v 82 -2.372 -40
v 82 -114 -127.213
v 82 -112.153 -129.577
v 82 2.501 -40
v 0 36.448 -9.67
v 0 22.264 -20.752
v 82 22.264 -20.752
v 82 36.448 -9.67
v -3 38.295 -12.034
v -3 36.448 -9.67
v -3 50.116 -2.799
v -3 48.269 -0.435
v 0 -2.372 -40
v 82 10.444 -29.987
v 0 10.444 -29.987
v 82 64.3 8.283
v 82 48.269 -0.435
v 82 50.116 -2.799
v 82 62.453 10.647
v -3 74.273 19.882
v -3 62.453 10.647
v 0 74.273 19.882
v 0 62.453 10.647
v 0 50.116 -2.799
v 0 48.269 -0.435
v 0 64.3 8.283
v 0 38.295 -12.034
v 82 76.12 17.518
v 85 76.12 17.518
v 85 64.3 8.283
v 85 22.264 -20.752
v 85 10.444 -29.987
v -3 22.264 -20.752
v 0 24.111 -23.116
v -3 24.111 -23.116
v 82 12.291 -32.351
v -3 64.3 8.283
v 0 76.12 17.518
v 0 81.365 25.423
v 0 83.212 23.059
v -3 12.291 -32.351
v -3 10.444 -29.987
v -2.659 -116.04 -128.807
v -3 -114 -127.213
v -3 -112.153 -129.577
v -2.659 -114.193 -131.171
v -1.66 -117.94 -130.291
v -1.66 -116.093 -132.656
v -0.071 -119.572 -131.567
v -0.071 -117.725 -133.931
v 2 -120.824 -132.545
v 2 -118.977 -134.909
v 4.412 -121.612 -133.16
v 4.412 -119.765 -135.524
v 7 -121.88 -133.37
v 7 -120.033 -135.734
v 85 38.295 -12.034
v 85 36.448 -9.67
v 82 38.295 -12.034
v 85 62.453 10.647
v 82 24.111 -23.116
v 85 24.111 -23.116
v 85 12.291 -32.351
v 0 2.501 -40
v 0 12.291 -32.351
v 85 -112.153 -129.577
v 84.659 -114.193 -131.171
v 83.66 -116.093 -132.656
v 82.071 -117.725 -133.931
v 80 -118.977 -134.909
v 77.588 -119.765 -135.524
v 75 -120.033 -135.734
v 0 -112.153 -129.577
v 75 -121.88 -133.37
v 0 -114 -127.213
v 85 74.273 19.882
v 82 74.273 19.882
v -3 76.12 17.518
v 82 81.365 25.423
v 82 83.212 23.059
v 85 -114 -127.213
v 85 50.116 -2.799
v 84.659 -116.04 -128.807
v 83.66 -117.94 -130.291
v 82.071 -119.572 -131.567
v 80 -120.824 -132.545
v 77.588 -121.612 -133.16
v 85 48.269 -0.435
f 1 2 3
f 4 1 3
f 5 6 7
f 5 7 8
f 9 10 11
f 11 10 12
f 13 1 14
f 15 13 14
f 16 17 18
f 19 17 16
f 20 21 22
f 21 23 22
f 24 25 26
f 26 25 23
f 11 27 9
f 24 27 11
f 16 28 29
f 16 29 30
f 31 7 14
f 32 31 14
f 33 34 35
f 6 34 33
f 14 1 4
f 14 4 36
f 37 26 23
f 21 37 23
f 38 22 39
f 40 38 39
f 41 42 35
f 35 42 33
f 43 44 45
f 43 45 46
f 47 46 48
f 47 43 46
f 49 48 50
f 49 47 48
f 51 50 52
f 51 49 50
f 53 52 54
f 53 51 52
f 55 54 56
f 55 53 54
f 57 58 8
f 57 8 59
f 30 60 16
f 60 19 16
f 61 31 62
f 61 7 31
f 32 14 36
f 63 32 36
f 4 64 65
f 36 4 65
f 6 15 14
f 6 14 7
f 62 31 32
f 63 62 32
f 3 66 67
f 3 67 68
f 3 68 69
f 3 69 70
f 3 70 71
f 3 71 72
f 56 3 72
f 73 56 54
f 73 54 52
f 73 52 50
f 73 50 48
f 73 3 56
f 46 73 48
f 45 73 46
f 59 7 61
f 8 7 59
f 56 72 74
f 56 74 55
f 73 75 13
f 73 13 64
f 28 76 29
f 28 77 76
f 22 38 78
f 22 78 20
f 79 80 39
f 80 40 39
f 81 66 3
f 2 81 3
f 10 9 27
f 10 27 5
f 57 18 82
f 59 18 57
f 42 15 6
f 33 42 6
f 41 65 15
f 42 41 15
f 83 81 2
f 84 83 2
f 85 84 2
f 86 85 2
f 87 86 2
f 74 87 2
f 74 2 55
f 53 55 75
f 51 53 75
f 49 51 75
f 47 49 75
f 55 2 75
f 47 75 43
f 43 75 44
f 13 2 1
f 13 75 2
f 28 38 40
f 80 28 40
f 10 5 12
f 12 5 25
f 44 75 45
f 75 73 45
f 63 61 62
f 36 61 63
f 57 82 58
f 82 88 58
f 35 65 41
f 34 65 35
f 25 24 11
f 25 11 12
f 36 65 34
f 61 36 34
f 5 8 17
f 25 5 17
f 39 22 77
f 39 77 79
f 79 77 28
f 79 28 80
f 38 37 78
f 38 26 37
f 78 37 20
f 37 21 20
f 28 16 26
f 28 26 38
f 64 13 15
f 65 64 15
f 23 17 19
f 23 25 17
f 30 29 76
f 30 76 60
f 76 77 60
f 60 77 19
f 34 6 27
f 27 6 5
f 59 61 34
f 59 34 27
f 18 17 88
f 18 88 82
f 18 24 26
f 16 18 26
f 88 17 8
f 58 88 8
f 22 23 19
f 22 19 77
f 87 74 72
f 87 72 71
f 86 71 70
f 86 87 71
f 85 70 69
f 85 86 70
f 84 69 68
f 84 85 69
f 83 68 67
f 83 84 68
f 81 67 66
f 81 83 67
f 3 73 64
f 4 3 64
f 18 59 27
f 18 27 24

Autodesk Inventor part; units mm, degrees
ref_plane "YZ Plane" through (0, 0, 0) normal (1, 0, 0) x (0, 1, 0)
ref_plane "XZ Plane" through (0, 0, 0) normal (0, 1, 0) x (-1, 0, 0)
sketch "Sketch2" plane through (0, 0, 0) normal (1, 0, 0) x (0, 1, 0)
  line L0 (-114, -127.2132) -> (-112.153, -129.5772)
  line L1 (-112.153, -129.5772) -> (84, 23.6743)
  line L2 (-114, -127.2132) -> (-114, -57.4172)
  line L3 (-114, -57.4172) -> (-84, -33.9786)
  circle A0 centre (0, 5) radius 17.5
  circle A1 centre (0, 5) radius 31
  line L4 (-114, -127.2132) -> (84, 27.4814)
  line L5 (84, -40) -> (84, 40)
  line L6 (-84, -40) -> (84, -40)
  line L7 (76.1199, 17.5177) -> (74.2729, 19.8817)
  line L8 (64.2997, 8.2828) -> (62.4527, 10.6468)
  line L9 (-84, 40) -> (-84, -40)
  line L10 (84, 40) -> (-84, 40)
  line L11 (38.2954, -12.034) -> (36.4484, -9.67)
  line L12 (50.1155, -2.7991) -> (48.2686, -0.4351)
  line L13 (12.291, -32.3509) -> (10.444, -29.9868)
  line L14 (24.1112, -23.116) -> (22.2642, -20.7519)
  line L15 (83.212, 23.0587) -> (81.365, 25.4227)
  point P0 (0, 0)
  dimension "d49" = 3
  dimension "d37" = 62
  dimension "d38" = 35
  dimension "d39" = 142
  dimension "d40" = 168
  dimension "d41" = 198
  dimension "d42" = 15
  dimension "d43" = 33
  dimension "d44" = 48
  dimension "d45" = 66
  dimension "d46" = 81
  dimension "d47" = 238.9218
  dimension "d48" = 80
  dimension "d50" = 58
  dimension "d51" = 84
  dimension "d52" = 70.7683
  dimension "d53" = 40
  dimension "d54" = 84
  dimension "d55" = 67.69
  dimension "d56" = 1
extrude "Extrusion1" add sketch "Sketch2" along normal blind 82 contours L4 L6 L1 L0 | L4 L13 L1 L6 | L4 L14 L1 L13 | L4 L11 L1 L14 | L4 L12 L1 L11 | L1 L7 L4 L15 | L4 L8 L1 L12 | L1 L8 L4 L7
extrude "Extrusion2" add sketch "Sketch2" against normal blind 3 contours L4 L14 L1 L13 | L4 L12 L1 L11 | L1 L8 L4 L7
ref_plane "Work Plane1" through (41, 0, 0) normal (-1, 0, 0) x (0, 0, 1)
mirror "Mirror1" about plane through (41, 0, 0) normal (-1, 0, 0) of "Extrusion2"
sketch "Sketch3" plane through (82, 34.1157, -15.2995) normal (0, 0.6156615, -0.7880108) x (-1, 0, 0)
  line L0 (-3, -195.6177) -> (85, -195.6177)
  line L1 (-3, -185.6177) -> (-3, -195.6177)
  line L2 (85, -185.6177) -> (85, -195.6177)
  line L3 (82, -185.6177) -> (82, -27.696) projected
  line L4 (0, -185.6177) -> (0, -27.696) projected
  line L5 (82, -185.6177) -> (0, -185.6177) projected
  line L6 (-3, -185.6177) -> (85, -185.6177)
  dimension "d57" = 10
  dimension "d58" = 3
  dimension "d59" = 3
extrude "Extrusion3" add sketch "Sketch3" against normal up to surface (3 mm away)
fillet "Fillet1" radius 10 2 edges at (85, -120.9566, -134.5518) (-3, -120.9566, -134.5518)
properties part number "Rampa"
